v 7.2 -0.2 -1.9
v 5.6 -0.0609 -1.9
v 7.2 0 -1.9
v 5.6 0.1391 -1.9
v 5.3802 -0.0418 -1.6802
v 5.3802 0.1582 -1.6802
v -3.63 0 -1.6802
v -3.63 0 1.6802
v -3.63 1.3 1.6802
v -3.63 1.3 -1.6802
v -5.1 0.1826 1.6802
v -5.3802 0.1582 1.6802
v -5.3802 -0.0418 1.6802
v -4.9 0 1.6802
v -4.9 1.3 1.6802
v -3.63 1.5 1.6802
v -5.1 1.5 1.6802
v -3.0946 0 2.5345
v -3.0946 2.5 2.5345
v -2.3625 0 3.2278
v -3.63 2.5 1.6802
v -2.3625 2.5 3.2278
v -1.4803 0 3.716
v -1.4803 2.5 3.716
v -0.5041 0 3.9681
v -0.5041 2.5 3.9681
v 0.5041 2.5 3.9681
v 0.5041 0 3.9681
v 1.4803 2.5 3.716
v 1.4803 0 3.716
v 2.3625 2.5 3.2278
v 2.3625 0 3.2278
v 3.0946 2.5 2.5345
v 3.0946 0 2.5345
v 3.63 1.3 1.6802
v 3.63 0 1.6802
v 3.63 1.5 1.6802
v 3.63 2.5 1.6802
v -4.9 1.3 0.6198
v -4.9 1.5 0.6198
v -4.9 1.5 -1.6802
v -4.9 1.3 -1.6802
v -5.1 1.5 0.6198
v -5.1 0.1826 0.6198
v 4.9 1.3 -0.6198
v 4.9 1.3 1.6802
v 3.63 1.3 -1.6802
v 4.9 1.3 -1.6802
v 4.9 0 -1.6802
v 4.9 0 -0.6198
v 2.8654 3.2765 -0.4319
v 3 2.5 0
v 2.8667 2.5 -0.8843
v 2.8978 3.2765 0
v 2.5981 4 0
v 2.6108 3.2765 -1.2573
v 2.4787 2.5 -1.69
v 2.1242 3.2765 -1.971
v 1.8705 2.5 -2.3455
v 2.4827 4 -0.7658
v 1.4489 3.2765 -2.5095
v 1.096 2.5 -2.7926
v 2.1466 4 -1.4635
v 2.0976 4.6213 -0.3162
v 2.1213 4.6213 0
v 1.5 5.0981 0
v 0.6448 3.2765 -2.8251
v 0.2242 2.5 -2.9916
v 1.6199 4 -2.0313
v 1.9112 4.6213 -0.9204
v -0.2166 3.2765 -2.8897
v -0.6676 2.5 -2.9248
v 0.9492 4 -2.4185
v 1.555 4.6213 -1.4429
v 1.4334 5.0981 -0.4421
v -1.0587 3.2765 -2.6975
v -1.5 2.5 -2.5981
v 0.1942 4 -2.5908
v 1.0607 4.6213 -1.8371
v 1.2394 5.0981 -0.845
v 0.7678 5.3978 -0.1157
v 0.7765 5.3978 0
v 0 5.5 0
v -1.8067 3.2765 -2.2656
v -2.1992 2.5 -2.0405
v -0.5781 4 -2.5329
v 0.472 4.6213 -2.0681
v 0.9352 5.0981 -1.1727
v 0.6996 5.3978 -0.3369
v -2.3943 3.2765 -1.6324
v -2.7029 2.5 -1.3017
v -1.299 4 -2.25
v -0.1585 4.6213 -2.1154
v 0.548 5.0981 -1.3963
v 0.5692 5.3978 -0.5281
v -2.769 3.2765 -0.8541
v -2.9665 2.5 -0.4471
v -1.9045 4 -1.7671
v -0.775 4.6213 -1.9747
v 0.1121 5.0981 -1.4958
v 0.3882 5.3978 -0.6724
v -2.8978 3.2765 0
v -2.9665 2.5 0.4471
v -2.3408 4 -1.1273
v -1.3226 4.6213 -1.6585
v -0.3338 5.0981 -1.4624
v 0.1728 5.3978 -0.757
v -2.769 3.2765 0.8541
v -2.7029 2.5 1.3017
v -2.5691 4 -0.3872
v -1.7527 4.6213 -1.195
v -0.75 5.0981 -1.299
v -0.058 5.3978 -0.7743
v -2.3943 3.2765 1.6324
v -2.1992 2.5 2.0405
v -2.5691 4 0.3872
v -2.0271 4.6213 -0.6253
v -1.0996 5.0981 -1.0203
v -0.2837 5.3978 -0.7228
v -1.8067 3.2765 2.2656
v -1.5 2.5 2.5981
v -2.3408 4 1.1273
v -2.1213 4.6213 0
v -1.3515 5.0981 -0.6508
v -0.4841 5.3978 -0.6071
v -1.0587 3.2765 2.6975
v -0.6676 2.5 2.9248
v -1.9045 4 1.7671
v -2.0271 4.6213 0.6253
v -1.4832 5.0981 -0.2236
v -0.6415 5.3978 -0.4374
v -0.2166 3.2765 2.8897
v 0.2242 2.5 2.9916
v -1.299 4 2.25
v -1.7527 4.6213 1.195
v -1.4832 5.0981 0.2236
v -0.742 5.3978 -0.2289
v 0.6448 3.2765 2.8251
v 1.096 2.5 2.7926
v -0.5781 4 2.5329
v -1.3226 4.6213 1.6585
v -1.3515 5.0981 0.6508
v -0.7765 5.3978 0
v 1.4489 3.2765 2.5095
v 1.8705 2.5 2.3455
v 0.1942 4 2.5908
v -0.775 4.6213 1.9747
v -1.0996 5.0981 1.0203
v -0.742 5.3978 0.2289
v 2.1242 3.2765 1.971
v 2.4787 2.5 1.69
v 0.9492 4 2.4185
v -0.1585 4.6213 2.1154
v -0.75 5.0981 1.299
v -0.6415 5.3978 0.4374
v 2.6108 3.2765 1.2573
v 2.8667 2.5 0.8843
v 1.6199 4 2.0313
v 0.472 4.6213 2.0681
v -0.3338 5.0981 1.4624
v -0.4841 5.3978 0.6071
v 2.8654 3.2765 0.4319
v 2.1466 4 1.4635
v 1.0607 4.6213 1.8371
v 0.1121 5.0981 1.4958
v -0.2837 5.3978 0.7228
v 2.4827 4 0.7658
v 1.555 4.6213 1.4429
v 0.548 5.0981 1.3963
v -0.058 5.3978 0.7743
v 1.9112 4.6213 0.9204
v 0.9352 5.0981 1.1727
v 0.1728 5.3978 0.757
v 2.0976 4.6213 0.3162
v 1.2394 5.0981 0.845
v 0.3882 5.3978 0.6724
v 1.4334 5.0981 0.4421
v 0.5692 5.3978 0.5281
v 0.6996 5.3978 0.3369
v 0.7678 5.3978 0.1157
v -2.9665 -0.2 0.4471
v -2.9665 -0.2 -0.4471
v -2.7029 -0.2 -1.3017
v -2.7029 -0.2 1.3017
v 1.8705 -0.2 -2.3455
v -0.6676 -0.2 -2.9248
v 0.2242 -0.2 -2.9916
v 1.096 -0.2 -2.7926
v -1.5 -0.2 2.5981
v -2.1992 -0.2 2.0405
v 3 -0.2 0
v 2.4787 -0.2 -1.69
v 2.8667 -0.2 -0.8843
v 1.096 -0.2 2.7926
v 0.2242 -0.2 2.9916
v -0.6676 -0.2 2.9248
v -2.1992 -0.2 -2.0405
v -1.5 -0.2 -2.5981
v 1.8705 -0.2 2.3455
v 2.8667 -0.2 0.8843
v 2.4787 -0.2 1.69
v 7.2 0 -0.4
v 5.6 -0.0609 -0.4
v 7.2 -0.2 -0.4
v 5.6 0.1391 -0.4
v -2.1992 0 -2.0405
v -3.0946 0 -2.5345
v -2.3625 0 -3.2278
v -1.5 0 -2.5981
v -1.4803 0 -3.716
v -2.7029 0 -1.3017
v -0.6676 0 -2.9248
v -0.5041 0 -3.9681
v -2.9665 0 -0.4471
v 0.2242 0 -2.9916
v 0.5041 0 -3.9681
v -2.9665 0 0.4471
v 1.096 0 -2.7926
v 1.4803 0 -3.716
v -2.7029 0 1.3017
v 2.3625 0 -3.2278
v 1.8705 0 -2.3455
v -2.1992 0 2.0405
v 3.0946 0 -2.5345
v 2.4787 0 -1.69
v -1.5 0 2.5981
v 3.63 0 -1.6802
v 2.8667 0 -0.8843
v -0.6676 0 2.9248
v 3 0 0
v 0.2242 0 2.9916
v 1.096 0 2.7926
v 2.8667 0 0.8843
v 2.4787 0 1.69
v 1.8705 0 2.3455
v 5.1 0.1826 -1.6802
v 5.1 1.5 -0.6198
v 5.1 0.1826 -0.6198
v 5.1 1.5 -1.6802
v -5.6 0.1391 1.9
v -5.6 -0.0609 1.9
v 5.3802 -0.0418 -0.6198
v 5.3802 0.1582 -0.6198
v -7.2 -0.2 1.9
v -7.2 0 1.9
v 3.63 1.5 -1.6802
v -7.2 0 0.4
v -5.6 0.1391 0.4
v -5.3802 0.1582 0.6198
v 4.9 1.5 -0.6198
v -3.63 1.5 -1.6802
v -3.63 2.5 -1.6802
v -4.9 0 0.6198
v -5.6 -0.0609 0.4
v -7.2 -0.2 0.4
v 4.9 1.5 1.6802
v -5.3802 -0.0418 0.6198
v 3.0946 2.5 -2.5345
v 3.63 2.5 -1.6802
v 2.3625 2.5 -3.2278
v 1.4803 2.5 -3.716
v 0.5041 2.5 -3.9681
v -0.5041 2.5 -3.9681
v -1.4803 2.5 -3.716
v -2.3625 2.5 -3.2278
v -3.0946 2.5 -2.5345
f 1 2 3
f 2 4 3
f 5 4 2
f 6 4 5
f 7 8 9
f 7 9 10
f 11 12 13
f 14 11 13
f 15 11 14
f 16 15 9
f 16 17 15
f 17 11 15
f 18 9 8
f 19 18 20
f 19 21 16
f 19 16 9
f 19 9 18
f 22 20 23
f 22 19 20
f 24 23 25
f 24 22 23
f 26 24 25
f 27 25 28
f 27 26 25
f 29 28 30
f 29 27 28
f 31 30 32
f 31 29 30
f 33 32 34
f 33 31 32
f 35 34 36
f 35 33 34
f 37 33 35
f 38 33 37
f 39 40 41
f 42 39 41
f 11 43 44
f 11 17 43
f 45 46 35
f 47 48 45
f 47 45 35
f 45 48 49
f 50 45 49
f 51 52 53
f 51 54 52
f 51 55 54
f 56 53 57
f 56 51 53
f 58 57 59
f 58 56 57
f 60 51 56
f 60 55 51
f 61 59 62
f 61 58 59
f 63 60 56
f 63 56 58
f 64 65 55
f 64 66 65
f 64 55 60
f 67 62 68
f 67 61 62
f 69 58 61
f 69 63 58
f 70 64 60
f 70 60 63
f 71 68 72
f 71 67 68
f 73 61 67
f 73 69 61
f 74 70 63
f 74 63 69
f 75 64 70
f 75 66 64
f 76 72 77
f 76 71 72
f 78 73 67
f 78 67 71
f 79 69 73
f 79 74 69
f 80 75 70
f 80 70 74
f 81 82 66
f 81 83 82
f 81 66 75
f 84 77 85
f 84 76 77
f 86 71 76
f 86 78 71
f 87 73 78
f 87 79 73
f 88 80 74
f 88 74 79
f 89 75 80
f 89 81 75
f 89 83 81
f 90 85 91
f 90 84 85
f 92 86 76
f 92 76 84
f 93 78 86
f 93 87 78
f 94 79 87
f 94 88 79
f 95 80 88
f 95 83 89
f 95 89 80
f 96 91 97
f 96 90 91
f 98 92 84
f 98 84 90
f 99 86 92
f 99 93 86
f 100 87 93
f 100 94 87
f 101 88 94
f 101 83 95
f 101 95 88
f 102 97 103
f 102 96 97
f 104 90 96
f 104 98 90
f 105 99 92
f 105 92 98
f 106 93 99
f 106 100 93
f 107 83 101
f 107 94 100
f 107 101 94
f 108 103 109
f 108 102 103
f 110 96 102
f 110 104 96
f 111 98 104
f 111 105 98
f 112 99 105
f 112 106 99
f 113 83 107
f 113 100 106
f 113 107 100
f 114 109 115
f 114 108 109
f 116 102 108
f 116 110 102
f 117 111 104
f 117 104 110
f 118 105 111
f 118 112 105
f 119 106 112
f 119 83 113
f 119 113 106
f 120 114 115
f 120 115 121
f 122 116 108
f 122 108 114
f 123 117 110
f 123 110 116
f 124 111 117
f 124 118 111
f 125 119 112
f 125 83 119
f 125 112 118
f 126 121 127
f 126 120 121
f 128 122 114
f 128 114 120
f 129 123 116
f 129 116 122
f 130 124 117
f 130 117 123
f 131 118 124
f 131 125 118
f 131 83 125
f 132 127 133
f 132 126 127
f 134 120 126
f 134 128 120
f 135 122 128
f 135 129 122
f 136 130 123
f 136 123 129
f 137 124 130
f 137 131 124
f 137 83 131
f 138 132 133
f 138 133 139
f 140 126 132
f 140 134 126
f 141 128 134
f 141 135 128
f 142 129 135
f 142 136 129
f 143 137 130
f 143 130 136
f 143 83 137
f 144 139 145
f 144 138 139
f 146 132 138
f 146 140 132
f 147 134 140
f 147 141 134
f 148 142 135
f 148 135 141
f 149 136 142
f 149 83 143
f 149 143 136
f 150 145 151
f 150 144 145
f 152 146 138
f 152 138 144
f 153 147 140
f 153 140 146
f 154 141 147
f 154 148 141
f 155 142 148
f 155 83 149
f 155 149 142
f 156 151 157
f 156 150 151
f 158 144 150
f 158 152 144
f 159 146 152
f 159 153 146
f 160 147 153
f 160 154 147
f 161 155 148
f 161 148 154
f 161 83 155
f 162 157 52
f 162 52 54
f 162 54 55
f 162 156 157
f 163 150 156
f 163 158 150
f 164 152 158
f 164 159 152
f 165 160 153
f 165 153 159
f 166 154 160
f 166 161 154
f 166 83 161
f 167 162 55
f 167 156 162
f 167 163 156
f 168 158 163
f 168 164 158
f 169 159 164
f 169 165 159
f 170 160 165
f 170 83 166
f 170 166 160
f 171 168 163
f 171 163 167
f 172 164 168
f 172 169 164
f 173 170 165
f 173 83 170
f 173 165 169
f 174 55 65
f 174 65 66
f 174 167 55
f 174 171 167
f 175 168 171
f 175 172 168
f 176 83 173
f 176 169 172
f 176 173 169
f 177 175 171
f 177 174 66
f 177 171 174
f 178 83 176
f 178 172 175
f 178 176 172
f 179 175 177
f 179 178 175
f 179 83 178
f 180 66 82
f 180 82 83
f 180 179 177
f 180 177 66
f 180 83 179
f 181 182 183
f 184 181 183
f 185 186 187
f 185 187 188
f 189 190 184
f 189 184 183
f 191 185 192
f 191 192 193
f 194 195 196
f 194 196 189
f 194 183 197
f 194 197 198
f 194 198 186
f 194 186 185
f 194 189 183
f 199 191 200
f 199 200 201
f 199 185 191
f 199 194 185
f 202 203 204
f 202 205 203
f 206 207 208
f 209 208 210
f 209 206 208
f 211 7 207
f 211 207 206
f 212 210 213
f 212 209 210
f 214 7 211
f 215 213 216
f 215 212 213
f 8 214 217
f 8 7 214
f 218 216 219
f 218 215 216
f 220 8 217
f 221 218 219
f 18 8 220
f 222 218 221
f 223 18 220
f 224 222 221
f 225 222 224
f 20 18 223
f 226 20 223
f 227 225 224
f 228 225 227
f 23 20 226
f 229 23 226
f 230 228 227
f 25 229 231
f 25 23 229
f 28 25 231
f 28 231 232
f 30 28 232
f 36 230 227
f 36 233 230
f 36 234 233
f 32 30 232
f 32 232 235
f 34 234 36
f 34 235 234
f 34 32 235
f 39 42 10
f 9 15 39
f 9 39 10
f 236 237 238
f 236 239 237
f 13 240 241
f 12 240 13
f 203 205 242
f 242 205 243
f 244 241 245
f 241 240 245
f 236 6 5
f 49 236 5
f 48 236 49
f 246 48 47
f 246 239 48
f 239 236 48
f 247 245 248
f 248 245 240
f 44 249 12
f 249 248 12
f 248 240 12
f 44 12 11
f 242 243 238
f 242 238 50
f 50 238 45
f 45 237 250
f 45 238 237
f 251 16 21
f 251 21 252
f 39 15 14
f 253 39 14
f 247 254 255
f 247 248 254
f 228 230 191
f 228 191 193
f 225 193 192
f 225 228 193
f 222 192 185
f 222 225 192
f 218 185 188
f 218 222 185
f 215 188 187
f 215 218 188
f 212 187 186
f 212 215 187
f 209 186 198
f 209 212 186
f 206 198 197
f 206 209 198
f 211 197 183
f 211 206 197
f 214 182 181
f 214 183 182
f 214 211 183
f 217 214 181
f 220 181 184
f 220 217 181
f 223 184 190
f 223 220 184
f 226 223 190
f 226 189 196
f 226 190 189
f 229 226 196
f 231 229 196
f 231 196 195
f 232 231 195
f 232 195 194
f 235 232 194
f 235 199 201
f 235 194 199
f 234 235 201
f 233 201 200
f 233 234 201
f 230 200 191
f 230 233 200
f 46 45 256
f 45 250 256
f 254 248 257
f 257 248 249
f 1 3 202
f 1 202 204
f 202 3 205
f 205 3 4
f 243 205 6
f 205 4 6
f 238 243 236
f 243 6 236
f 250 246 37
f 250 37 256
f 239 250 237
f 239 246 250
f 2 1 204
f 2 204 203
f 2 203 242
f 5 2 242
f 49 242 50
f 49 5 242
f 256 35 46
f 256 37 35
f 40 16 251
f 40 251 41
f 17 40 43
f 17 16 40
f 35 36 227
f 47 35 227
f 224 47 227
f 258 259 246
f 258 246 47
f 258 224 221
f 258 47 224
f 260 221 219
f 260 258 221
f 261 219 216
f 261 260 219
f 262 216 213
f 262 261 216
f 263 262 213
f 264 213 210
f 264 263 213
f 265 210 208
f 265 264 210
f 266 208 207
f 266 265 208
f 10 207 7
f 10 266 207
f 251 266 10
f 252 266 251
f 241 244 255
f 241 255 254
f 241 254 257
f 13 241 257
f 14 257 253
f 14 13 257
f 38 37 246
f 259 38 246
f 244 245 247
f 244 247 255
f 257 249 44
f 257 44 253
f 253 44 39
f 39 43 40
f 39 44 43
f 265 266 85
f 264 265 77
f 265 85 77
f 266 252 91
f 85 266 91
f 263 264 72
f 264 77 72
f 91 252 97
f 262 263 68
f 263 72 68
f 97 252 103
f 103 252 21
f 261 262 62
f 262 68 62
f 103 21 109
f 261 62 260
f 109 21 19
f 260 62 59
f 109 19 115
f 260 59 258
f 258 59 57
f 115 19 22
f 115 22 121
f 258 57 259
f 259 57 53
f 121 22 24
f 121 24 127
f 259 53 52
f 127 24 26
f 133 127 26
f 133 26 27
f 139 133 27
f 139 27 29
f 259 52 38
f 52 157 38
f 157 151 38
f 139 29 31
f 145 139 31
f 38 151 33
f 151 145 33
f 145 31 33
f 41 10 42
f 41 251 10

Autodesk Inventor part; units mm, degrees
ref_plane "YZ Plane" through (0, 0, 0) normal (1, 0, 0) x (0, 1, 0)
ref_plane "XZ Plane" through (0, 0, 0) normal (0, 1, 0) x (-1, 0, 0)
ref_plane "XY Plane" through (0, 0, 0) normal (0, 0, 1) x (1, 0, 0)
sketch "草图1" plane through (0, 0, 0) normal (0, 0, 1) x (1, 0, 0)
  line L0 (0, 0) -> (4, 0)
  line L1 (4, 0) -> (4, 2.5)
  line L2 (4, 2.5) -> (0, 2.5)
  line L3 (0, 2.5) -> (0, 0)
  line L4 (0, 2.5) -> (0, 5.5)
  arc A0 (3, 2.5) -> (0, 5.5) centre (0, 2.5) ccw
  dimension "d0" = 4
  dimension "d1" = 2.5
  dimension "d2" = 3
revolve "旋转1" add sketch "草图1" angle 360 about axis through (0, 2.5, 0) along (0, -1, 0)
sketch "草图2" plane through (0, 0, 0) normal (0, -1, 0) x (1, 0, 0)
  circle A0 centre (0, 0) radius 4 projected
  line L0 (3.63, 1.6802) -> (3.63, -1.6802)
  circle A1 centre (0, 0) radius 4 projected
  line L1 (0, 0) -> (0, -4) construction
  line L2 (-3.63, 1.6802) -> (-3.63, -1.6802)
  dimension "d4" = 3.63
extrude "拉伸1" cut sketch "草图2" against normal through all contours A0 L0 | L2 A0
sketch "草图3" plane through (0, 0, 0) normal (0, -1, 0) x (1, 0, 0)
  circle A0 centre (0, 0) radius 3
  dimension "d7" = 6
extrude "拉伸2" add sketch "草图3" along normal blind 0.2
sketch "草图4" plane through (0, 0, 0) normal (0, 0, 1) x (1, 0, 0)
  line L0 (3.63, 0) -> (3.63, 2.5) projected
  line L1 (3.63, 2.5) -> (3.63, 0) projected
  line L2 (3.63, 1.5) -> (5.1, 1.5)
  line L3 (5.1, 1.5) -> (5.1, 1.3)
  line L4 (5.1, 1.3) -> (3.63, 1.3)
  line L5 (3.63, 1.3) -> (3.63, 1.5)
  line L6 (-3.63, 2.5) -> (3.63, 2.5) projected
  line L7 (5.1, 1.5) -> (4.9, 1.5)
  line L8 (4.9, 1.5) -> (4.9, 0)
  line L9 (4.9, 0) -> (5.1, 0)
  line L10 (5.1, 0) -> (5.1, 1.5)
  line L11 (7.2, 0) -> (7.2, -0.2) construction
  line L12 (7.2, -0.2) -> (4.9, 0)
  line L13 (7.2, 0) -> (5.1, 0.1826)
  line L14 (7.2, 0) -> (7.2, -0.2)
  point P0 (0, 0)
  point P1 (4.9, 1.3)
  dimension "d10" = 1.47
  dimension "d11" = 1
  dimension "d12" = 0.2
  dimension "d13" = 0.2
  dimension "d14" = 1.5
  dimension "d15" = 0.2
  dimension "d16" = 2.1
extrude "拉伸3" add sketch "草图4" along normal mid plane 3.8
sketch "草图5" plane through (3.63, 1.5, 1.9) normal (0, 1, 0) x (1, 0, 0)
  line L0 (0, 3.8) -> (0, 3.5802) projected
  line L1 (0, 0.2198) -> (0, 3.5802) projected
  line L2 (0, 0.2198) -> (0, 0) projected
  line L3 (1.47, 0) -> (0, 0) projected
  line L4 (1.47, 0) -> (1.47, 3.8) projected
  line L5 (0, 3.8) -> (1.47, 3.8) projected
  line L6 (1.47, 3.8) -> (1.47, 0) projected
  line L7 (3.57, 0) -> (1.47, 0) projected
  line L8 (3.57, 3.8) -> (3.57, 0) projected
  line L9 (1.47, 3.8) -> (3.57, 3.8) projected
  line L10 (3.57, 3.8) -> (1.97, 3.8)
  line L11 (1.97, 3.8) -> (1.97, 2.3)
  line L12 (1.97, 2.3) -> (3.57, 2.3)
  line L13 (3.57, 2.3) -> (3.57, 3.8)
  line L14 (0, 3.5802) -> (1.97, 3.5802) construction
  line L15 (3.57, 3.8) -> (3.57, 0) projected
  line L16 (1.97, 3.05) -> (3.57, 3.05) construction
  line L17 (1.97, 3.8) -> (1.7502, 3.5802)
  line L18 (1.7502, 3.5802) -> (0, 3.5802)
  line L19 (0, 2.5198) -> (1.97, 2.5198) construction
  line L20 (1.97, 2.3) -> (1.7502, 2.5198)
  line L21 (1.7502, 2.5198) -> (1.47, 2.5198)
  line L22 (1.47, 0) -> (1.47, 3.8) projected
  line L23 (1.27, 3.8) -> (1.27, 0) projected
  line L24 (1.47, 2.5198) -> (1.27, 2.5198)
  line L25 (0, 0.2198) -> (0, 0) projected
  line L26 (0, 0.2198) -> (1.27, 0.2198)
  point P0 (-3.63, 1.9)
  dimension "d19" = 1.6
  dimension "d20" = 1.5
  dimension "d21" = 45
extrude "拉伸4" cut sketch "草图5" against normal through all contours L5 L23 L18 L0 | L5 L4 L18 L23 | L26 L23 L3 L2 | L9 L17 L18 L4 | L23 L24 L4 L3 | L21 L20 L12 L8 L7 L4
pattern_circular "环形阵列1" count 2 over 360 about axis through (0, -10, 0) along (0, 1, 0) of "拉伸3", "拉伸4"
properties part number "COB5730"
